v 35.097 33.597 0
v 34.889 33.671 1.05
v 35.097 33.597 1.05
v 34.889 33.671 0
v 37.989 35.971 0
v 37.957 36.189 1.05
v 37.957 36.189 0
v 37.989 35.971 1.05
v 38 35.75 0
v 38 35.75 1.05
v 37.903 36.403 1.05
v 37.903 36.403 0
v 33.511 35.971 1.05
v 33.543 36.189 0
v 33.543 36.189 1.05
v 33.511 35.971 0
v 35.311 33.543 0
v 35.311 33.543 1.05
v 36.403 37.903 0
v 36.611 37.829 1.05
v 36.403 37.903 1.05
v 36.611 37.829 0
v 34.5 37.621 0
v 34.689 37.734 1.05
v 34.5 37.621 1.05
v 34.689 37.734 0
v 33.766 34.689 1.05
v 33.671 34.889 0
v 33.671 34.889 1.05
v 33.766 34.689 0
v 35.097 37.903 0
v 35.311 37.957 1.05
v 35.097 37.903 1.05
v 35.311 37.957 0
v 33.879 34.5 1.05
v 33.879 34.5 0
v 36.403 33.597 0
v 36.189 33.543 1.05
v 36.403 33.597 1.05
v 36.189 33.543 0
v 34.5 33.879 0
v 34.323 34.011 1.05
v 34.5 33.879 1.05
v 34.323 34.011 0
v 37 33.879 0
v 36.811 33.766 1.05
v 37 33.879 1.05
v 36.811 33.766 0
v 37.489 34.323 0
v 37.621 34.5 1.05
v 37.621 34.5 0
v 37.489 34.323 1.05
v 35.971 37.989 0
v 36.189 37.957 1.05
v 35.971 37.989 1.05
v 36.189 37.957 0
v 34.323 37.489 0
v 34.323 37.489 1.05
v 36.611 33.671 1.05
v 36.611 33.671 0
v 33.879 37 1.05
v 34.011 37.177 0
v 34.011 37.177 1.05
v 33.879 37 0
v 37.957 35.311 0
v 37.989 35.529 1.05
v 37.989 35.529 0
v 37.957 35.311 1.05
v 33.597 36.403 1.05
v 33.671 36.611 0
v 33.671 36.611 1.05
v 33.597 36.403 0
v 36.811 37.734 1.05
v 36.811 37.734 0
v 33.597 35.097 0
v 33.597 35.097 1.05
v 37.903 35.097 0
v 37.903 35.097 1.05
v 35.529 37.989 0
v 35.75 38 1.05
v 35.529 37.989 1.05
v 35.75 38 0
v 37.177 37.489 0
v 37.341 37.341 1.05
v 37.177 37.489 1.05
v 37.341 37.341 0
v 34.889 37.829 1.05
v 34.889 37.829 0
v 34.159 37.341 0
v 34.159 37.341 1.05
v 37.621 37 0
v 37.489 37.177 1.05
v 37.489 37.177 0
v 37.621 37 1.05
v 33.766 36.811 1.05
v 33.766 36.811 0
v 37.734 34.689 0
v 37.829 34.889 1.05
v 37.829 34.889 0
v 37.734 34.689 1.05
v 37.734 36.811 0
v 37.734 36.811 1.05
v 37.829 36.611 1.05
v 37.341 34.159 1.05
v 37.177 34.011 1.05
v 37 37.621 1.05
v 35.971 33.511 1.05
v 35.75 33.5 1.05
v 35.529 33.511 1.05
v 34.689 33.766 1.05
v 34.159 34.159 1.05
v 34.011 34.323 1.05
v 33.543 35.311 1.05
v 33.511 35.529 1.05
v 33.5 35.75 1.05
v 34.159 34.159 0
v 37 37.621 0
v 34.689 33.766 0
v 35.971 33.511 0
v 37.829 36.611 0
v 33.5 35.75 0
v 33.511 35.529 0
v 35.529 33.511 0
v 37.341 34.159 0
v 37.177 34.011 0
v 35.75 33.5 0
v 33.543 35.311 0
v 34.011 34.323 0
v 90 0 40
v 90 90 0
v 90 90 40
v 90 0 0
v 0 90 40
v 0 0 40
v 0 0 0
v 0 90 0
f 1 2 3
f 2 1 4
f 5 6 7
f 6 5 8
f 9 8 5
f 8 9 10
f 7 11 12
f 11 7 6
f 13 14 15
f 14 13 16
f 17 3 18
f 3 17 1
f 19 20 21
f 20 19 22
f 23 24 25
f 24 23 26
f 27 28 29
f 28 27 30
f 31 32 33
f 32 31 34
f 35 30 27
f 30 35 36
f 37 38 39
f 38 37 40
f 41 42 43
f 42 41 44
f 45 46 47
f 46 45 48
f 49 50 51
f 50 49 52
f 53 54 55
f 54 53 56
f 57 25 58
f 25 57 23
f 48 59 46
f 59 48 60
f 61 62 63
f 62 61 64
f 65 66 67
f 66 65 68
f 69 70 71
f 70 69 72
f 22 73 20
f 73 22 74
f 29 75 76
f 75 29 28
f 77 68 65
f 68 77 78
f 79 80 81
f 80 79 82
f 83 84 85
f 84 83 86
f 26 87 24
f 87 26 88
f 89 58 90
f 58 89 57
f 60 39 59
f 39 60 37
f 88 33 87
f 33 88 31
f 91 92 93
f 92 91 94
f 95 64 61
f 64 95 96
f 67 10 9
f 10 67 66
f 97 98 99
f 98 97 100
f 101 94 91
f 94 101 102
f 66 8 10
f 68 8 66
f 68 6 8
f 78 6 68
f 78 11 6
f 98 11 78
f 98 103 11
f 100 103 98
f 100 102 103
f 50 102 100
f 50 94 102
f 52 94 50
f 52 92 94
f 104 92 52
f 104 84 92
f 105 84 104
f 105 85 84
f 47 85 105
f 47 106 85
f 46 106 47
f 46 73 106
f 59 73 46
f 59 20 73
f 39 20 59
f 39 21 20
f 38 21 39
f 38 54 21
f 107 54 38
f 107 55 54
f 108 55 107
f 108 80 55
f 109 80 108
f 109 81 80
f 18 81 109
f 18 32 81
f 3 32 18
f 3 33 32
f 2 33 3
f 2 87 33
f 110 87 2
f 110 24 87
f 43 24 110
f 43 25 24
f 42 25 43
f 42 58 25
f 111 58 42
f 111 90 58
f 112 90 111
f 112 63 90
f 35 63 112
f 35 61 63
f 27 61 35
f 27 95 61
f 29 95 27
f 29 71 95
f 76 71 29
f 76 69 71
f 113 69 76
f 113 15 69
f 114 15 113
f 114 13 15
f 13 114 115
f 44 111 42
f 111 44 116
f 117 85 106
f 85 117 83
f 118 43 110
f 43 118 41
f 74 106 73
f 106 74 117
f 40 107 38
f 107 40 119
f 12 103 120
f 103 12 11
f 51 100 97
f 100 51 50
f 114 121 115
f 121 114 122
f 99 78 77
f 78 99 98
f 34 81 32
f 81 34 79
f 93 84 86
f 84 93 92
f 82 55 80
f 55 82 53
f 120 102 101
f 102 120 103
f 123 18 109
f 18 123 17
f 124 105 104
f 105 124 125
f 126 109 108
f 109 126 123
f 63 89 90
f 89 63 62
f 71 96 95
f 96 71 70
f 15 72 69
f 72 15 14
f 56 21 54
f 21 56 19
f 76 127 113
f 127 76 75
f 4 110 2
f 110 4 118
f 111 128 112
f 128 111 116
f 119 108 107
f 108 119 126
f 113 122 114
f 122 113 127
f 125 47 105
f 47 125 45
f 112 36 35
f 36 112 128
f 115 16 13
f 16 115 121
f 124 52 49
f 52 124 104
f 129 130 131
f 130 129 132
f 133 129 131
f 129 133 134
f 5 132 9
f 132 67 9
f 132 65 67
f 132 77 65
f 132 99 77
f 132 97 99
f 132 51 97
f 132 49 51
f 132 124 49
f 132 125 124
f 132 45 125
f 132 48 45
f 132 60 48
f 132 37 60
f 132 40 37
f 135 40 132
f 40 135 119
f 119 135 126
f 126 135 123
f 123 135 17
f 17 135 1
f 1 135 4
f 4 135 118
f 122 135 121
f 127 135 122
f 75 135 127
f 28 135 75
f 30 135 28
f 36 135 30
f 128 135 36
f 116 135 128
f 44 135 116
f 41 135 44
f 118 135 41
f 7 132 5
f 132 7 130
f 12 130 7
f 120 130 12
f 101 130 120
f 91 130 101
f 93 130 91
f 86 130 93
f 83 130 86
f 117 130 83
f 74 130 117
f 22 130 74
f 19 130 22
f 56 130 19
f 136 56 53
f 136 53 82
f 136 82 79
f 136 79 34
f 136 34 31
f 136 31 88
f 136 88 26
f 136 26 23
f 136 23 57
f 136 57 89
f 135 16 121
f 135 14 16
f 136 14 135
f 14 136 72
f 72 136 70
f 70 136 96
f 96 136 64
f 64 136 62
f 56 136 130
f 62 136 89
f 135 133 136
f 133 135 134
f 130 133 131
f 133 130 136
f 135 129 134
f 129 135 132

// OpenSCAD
// DIY Magnetic Stirrer Housing for 80mm PC Fan
// Print Orientation: Upside down (Top plate on bed)
// Units: mm

// --- Dimensions ---
// Outer footprint of the housing
W_OUT = 90;
H_OUT = 90;

// Thickness of the top plate (bottom of the box in print orientation)
THICK_TOP = 2;

// Height of the walls (Total height 40mm - 2mm top plate)
H_WALL = 38; 

// Wall thickness
THICK_WALL = 2.5;

// Fan mounting hole diameter (M4 clearance)
D_FAN_HOLE = 4.5;

// Fan mounting hole pattern: 71.5mm square, centred on the plate
// Pattern size is the distance between centers
PATTERN_SIZE = 71.5;

// Cable notch dimensions
NOTCH_W = 12;
NOTCH_H = 8; // Depth from open edge (z=40) down to z=32

// Resolution for curved features
$fn = 64;

// --- Helper: Create the main box block ---
module stirrer_housing() {
    // Total height
    h_total = THICK_TOP + H_WALL;
    
    difference() {
        // 1. Main Block
        // Outer size: W_OUT x H_OUT
        // Height: h_total
        // Centered at origin for X/Y, sitting on Z=0
        translate([0, 0, 0])
            cube([W_OUT, H_OUT, h_total], center = false);
        
        // 2. Cut Fan Mounting Holes through the top plate
        // Pattern: 71.5mm square centred on the 90x90 plate.
        // Centers are at: +/- 35.75, +/- 35.75
        // Z range: 0 to THICK_TOP (2mm)
        
        // Define the 4 offsets for the square pattern explicitly
        // (x, y) coordinates relative to the center of the 90x90 plate
        hole_offsets = [
            [-PATTERN_SIZE/2, -PATTERN_SIZE/2],
            [-PATTERN_SIZE/2,  PATTERN_SIZE/2],
            [ PATTERN_SIZE/2, -PATTERN_SIZE/2],
            [ PATTERN_SIZE/2,  PATTERN_SIZE/2]
        ];
        
        for (p = hole_offsets) {
            // p[0] is X offset, p[1] is Y offset
            translate([p[0], p[1], 0])
                cylinder(
                    h = THICK_TOP + 0.1, // Extend slightly past top plate to ensure clean cut
                    r = D_FAN_HOLE/2,
                    center = true
                );
        }
        
        // 3. Cut Cable Notch
        // Location: One wall. Let's choose the wall at X = -W_OUT/2 (Left wall).
        // Wall Face X coordinate: -45
        // Notch Width: 12mm. Centred along the wall (Y direction).
        // Depth: 8mm from the open edge (z=40) down to z=32.
        
        // We define a cutting box that represents the void.
        // Dimensions: [Width, Height, Depth]
        // Width: NOTCH_W (12)
        // Height: H_OUT (90) - must cover the full height of the wall to cut through it cleanly
        // Depth: NOTCH_H (8) + epsilon to ensure it cuts through the wall thickness
        
        // Position:
        // X: Centered on the wall face. The wall face is at X = -45.
        // The notch width is 12. So it spans from -45 - 6 to -45 + 6.
        // Y: Centered on the wall. Wall height is 90. Center is 0.
        // Z: From 32 to 40.
        
        translate([
            -W_OUT/2 - NOTCH_W/2, // X start of notch (-45 - 6 = -51)
            -NOTCH_H/2,           // Y center (0)
            32                    // Z start of notch
        ])
            cube([
                NOTCH_W,          // Width 12
                H_OUT,            // Height 90 (covers full wall)
                NOTCH_H + 0.1     // Depth 8 + epsilon to cut through wall thickness
            ]);
    }
}

// --- Main Assembly ---
// Center the part on the origin as requested
translate([0, 0, 0])
    stirrer_housing();
